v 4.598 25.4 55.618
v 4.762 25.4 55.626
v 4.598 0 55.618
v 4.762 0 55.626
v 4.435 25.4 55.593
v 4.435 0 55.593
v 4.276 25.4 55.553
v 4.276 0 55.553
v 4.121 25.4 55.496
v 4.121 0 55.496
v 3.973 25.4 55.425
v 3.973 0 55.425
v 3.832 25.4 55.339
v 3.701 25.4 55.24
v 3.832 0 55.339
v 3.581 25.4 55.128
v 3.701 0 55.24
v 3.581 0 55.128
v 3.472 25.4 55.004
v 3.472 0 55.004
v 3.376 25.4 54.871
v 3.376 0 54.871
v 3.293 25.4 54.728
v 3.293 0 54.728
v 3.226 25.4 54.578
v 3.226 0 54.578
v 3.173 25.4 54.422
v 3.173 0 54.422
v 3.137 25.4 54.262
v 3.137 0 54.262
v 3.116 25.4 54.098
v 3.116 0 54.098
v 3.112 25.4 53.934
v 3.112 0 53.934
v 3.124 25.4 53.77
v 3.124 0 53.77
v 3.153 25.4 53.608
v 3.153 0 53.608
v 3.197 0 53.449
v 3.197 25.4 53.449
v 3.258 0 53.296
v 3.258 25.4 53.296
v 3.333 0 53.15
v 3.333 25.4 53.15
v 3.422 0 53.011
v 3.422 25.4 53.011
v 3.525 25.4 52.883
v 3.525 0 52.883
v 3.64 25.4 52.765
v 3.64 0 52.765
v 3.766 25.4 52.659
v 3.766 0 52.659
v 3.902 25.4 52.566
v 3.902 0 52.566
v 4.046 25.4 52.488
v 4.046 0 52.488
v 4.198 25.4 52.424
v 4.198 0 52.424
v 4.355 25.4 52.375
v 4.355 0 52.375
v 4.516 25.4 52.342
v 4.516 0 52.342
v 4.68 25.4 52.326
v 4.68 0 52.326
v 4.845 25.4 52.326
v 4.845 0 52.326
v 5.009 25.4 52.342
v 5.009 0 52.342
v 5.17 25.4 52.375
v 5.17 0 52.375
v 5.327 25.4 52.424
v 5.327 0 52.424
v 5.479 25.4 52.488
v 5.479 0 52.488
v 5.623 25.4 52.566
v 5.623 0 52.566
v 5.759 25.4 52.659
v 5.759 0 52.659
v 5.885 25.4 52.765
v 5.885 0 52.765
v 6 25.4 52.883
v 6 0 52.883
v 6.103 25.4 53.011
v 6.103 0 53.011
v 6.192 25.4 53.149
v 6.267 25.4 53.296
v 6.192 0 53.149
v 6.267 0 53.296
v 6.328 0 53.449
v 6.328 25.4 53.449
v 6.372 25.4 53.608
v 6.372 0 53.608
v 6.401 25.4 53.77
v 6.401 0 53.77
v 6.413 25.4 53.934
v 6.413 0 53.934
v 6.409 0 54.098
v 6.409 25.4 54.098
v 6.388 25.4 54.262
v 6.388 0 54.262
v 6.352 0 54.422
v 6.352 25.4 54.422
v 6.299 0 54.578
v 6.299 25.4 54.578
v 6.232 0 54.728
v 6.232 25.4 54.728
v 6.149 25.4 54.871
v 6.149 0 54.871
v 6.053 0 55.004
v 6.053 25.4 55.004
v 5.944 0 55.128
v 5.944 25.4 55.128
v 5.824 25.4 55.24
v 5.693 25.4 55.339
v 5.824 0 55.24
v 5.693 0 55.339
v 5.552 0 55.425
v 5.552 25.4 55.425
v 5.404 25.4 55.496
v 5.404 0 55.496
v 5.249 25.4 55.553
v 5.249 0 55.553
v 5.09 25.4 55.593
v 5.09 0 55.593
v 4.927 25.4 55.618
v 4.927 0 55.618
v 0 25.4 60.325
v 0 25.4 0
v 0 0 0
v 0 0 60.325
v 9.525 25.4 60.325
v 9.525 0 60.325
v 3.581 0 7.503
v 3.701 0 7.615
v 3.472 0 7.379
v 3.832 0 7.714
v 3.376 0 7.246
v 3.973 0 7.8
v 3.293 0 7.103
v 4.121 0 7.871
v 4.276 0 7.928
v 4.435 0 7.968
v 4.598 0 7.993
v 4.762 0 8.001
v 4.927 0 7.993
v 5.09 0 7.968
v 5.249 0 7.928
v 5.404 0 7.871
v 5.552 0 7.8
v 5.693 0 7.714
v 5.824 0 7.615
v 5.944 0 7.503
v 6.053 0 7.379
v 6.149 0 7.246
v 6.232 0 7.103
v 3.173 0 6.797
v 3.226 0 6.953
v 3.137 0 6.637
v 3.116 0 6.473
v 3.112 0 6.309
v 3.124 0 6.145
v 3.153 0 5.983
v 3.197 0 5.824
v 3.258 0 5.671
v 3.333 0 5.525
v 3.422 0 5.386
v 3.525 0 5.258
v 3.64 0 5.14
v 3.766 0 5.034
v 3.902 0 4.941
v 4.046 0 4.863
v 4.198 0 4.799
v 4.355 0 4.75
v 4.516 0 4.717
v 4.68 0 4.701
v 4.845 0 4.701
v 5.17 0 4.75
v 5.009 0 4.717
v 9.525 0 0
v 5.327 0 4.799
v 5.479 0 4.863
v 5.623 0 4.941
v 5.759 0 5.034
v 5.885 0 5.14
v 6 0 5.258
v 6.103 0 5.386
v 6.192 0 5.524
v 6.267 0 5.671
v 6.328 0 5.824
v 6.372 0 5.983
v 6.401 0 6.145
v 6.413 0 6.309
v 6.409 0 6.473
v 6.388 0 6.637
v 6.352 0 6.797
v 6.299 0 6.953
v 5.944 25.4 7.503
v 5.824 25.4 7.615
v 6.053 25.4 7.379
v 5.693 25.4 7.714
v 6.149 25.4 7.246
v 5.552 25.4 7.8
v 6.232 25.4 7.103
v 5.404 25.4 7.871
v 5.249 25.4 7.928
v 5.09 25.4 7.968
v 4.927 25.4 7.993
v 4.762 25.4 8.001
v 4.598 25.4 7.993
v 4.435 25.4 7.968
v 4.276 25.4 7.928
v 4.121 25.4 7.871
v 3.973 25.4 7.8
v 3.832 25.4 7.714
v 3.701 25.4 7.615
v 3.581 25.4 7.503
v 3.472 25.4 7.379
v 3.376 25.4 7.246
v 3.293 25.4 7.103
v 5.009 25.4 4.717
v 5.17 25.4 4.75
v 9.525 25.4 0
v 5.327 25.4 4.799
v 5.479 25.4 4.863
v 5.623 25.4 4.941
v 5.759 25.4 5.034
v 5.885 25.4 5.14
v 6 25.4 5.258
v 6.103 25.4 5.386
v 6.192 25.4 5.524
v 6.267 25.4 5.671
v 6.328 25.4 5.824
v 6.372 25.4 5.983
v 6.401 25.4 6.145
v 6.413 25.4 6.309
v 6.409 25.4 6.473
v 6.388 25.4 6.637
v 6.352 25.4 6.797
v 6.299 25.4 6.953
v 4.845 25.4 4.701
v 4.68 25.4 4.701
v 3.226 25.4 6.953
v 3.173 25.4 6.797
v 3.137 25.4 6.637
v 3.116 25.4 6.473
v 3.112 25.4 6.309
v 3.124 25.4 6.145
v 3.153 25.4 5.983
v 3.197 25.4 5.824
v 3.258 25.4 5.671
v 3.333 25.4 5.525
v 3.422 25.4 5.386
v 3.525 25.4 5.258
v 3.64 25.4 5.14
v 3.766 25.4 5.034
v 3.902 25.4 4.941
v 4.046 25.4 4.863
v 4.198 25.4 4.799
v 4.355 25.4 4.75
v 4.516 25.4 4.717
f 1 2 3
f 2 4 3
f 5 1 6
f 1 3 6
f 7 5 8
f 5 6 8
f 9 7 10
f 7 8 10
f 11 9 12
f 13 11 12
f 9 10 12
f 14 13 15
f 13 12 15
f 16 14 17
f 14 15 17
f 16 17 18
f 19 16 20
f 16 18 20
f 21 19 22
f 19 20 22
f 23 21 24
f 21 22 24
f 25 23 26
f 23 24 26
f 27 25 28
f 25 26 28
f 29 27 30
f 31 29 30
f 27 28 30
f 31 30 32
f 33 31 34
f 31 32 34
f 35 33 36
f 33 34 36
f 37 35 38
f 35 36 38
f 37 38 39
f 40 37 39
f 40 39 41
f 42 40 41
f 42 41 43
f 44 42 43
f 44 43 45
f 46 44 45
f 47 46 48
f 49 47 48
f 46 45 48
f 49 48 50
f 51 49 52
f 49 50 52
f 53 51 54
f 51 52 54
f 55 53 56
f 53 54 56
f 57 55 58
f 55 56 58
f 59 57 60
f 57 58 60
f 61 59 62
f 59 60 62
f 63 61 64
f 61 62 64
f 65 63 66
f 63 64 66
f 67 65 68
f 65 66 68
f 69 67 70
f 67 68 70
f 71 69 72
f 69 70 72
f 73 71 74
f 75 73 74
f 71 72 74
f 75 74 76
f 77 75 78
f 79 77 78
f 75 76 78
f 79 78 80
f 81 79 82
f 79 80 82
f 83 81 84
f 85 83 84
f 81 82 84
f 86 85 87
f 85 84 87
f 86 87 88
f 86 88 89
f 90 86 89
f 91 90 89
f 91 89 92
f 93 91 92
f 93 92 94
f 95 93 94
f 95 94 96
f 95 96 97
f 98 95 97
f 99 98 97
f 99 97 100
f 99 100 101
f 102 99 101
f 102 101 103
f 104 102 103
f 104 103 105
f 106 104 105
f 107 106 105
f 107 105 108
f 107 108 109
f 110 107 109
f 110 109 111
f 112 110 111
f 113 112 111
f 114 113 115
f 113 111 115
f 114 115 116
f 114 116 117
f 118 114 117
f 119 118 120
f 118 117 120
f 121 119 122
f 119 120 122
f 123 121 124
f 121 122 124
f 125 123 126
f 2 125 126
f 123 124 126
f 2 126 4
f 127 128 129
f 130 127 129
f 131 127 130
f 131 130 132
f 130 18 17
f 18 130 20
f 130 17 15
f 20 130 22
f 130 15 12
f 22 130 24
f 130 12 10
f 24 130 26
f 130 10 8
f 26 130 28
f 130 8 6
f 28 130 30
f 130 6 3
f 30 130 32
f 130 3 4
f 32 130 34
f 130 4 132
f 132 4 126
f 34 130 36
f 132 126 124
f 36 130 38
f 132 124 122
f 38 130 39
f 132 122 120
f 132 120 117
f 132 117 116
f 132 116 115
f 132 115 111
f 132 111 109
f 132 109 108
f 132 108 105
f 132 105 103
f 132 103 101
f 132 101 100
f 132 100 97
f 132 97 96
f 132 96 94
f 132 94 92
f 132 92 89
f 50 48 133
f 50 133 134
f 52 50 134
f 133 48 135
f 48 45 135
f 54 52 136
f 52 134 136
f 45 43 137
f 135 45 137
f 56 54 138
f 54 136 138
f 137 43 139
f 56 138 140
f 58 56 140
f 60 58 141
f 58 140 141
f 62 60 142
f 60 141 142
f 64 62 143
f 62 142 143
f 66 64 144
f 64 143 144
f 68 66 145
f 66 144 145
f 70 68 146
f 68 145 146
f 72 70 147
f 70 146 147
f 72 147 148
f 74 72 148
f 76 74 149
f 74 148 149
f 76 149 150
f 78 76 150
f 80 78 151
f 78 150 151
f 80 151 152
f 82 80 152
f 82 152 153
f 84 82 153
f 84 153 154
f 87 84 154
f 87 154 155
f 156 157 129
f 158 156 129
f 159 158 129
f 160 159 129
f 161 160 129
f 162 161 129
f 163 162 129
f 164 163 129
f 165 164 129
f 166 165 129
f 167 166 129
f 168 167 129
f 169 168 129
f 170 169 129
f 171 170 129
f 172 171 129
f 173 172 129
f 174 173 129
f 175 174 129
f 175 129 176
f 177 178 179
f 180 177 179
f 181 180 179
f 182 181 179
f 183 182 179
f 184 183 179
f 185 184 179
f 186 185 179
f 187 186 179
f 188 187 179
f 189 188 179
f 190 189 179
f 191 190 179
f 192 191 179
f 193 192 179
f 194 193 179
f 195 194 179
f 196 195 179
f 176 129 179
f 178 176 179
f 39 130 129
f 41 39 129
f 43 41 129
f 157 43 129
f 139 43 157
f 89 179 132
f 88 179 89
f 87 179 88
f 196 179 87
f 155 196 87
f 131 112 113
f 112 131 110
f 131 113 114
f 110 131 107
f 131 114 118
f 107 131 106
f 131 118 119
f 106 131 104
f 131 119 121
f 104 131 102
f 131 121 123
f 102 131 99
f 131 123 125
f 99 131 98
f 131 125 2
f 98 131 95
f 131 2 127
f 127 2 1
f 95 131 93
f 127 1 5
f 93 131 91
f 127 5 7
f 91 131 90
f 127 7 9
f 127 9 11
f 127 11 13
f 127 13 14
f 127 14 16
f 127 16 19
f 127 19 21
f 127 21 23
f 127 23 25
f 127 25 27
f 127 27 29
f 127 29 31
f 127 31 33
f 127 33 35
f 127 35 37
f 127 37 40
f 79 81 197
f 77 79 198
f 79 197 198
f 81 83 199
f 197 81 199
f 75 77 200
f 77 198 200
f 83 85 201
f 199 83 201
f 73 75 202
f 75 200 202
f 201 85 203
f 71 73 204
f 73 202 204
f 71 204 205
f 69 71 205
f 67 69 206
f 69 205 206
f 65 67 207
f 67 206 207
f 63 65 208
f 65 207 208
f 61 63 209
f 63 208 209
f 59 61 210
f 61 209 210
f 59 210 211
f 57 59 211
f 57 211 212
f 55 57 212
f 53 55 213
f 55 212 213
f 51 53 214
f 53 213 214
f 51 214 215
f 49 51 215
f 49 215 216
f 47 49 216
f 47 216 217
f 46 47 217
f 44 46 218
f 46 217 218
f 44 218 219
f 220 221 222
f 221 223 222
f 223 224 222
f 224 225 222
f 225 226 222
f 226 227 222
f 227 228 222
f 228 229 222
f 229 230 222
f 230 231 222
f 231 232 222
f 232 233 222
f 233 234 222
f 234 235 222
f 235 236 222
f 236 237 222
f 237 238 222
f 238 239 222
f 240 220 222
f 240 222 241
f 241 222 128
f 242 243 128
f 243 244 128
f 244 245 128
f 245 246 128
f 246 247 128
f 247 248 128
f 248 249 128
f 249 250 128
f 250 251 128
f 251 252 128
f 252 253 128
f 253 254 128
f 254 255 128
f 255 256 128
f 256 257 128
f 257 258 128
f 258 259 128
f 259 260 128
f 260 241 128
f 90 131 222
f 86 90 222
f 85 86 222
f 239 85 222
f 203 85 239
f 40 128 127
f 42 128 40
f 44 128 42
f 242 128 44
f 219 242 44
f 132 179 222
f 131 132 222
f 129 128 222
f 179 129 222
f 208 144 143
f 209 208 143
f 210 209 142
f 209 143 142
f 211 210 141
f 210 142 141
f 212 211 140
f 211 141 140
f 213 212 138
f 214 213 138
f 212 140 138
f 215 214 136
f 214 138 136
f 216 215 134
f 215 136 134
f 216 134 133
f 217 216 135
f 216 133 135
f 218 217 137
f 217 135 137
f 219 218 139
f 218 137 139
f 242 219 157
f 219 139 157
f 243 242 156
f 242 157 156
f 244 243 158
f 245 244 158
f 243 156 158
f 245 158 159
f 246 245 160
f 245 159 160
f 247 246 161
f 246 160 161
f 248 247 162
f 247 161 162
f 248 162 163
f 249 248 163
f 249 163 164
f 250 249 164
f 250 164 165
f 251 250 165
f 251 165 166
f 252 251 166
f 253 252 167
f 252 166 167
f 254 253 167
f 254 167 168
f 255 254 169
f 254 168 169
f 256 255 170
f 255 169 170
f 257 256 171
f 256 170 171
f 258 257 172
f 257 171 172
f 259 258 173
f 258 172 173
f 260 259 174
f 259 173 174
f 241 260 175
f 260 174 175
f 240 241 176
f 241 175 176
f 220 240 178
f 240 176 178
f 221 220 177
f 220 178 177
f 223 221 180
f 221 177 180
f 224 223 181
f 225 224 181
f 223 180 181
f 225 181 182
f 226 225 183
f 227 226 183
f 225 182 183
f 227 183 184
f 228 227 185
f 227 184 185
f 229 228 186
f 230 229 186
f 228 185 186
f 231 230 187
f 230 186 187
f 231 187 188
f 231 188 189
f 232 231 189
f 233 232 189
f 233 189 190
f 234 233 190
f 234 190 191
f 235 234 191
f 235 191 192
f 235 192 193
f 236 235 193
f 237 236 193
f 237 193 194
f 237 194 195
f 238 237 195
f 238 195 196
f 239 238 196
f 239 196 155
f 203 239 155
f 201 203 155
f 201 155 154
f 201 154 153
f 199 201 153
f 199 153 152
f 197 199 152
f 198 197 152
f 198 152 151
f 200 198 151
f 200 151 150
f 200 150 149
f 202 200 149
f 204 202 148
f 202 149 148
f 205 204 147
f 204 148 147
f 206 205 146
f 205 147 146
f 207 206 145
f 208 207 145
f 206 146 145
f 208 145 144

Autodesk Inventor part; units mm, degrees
ref_plane "YZ Plane" through (0, 0, 0) normal (1, 0, 0) x (0, 1, 0)
ref_plane "XZ Plane" through (0, 0, 0) normal (0, 1, 0) x (-1, 0, 0)
ref_plane "XY Plane" through (0, 0, 0) normal (0, 0, 1) x (1, 0, 0)
sketch "Sketch1" plane through (0, 0, 0) normal (0, 0, 1) x (1, 0, 0)
  line L0 (0, 0) -> (9.525, 0)
  line L1 (9.525, 0) -> (9.525, 25.4)
  line L2 (9.525, 25.4) -> (0, 25.4)
  line L3 (0, 25.4) -> (0, 0)
  dimension "d0" = 9.525
  dimension "d1" = 25.4
extrude "Extrusion1" add sketch "Sketch1" along normal blind 60.325
sketch "Sketch2" plane through (0, 25.4, 0) normal (0, 1, 0) x (1, 0, 0)
  line L0 (0, 0) -> (0, -60.325) construction
  line L1 (9.525, -60.325) -> (0, -60.325) construction
  line L2 (0, -30.1625) -> (9.525, -30.1625) construction
  point P0 (4.7625, -53.975)
  point P1 (4.7625, -6.35)
  dimension "d4" = 4.7625
  dimension "d5" = 6.35
hole "Hole1" at (4.7625, 25.4, 53.975) at (4.7625, 25.4, 6.35) direction (0, -1, 0) diameter 3.302 end through all thread size "8-32 UNC" class "2B" standard "ANSI Unified Screw Threads"
properties part number "ImagineFrameSides" material "SAN Plastic"
